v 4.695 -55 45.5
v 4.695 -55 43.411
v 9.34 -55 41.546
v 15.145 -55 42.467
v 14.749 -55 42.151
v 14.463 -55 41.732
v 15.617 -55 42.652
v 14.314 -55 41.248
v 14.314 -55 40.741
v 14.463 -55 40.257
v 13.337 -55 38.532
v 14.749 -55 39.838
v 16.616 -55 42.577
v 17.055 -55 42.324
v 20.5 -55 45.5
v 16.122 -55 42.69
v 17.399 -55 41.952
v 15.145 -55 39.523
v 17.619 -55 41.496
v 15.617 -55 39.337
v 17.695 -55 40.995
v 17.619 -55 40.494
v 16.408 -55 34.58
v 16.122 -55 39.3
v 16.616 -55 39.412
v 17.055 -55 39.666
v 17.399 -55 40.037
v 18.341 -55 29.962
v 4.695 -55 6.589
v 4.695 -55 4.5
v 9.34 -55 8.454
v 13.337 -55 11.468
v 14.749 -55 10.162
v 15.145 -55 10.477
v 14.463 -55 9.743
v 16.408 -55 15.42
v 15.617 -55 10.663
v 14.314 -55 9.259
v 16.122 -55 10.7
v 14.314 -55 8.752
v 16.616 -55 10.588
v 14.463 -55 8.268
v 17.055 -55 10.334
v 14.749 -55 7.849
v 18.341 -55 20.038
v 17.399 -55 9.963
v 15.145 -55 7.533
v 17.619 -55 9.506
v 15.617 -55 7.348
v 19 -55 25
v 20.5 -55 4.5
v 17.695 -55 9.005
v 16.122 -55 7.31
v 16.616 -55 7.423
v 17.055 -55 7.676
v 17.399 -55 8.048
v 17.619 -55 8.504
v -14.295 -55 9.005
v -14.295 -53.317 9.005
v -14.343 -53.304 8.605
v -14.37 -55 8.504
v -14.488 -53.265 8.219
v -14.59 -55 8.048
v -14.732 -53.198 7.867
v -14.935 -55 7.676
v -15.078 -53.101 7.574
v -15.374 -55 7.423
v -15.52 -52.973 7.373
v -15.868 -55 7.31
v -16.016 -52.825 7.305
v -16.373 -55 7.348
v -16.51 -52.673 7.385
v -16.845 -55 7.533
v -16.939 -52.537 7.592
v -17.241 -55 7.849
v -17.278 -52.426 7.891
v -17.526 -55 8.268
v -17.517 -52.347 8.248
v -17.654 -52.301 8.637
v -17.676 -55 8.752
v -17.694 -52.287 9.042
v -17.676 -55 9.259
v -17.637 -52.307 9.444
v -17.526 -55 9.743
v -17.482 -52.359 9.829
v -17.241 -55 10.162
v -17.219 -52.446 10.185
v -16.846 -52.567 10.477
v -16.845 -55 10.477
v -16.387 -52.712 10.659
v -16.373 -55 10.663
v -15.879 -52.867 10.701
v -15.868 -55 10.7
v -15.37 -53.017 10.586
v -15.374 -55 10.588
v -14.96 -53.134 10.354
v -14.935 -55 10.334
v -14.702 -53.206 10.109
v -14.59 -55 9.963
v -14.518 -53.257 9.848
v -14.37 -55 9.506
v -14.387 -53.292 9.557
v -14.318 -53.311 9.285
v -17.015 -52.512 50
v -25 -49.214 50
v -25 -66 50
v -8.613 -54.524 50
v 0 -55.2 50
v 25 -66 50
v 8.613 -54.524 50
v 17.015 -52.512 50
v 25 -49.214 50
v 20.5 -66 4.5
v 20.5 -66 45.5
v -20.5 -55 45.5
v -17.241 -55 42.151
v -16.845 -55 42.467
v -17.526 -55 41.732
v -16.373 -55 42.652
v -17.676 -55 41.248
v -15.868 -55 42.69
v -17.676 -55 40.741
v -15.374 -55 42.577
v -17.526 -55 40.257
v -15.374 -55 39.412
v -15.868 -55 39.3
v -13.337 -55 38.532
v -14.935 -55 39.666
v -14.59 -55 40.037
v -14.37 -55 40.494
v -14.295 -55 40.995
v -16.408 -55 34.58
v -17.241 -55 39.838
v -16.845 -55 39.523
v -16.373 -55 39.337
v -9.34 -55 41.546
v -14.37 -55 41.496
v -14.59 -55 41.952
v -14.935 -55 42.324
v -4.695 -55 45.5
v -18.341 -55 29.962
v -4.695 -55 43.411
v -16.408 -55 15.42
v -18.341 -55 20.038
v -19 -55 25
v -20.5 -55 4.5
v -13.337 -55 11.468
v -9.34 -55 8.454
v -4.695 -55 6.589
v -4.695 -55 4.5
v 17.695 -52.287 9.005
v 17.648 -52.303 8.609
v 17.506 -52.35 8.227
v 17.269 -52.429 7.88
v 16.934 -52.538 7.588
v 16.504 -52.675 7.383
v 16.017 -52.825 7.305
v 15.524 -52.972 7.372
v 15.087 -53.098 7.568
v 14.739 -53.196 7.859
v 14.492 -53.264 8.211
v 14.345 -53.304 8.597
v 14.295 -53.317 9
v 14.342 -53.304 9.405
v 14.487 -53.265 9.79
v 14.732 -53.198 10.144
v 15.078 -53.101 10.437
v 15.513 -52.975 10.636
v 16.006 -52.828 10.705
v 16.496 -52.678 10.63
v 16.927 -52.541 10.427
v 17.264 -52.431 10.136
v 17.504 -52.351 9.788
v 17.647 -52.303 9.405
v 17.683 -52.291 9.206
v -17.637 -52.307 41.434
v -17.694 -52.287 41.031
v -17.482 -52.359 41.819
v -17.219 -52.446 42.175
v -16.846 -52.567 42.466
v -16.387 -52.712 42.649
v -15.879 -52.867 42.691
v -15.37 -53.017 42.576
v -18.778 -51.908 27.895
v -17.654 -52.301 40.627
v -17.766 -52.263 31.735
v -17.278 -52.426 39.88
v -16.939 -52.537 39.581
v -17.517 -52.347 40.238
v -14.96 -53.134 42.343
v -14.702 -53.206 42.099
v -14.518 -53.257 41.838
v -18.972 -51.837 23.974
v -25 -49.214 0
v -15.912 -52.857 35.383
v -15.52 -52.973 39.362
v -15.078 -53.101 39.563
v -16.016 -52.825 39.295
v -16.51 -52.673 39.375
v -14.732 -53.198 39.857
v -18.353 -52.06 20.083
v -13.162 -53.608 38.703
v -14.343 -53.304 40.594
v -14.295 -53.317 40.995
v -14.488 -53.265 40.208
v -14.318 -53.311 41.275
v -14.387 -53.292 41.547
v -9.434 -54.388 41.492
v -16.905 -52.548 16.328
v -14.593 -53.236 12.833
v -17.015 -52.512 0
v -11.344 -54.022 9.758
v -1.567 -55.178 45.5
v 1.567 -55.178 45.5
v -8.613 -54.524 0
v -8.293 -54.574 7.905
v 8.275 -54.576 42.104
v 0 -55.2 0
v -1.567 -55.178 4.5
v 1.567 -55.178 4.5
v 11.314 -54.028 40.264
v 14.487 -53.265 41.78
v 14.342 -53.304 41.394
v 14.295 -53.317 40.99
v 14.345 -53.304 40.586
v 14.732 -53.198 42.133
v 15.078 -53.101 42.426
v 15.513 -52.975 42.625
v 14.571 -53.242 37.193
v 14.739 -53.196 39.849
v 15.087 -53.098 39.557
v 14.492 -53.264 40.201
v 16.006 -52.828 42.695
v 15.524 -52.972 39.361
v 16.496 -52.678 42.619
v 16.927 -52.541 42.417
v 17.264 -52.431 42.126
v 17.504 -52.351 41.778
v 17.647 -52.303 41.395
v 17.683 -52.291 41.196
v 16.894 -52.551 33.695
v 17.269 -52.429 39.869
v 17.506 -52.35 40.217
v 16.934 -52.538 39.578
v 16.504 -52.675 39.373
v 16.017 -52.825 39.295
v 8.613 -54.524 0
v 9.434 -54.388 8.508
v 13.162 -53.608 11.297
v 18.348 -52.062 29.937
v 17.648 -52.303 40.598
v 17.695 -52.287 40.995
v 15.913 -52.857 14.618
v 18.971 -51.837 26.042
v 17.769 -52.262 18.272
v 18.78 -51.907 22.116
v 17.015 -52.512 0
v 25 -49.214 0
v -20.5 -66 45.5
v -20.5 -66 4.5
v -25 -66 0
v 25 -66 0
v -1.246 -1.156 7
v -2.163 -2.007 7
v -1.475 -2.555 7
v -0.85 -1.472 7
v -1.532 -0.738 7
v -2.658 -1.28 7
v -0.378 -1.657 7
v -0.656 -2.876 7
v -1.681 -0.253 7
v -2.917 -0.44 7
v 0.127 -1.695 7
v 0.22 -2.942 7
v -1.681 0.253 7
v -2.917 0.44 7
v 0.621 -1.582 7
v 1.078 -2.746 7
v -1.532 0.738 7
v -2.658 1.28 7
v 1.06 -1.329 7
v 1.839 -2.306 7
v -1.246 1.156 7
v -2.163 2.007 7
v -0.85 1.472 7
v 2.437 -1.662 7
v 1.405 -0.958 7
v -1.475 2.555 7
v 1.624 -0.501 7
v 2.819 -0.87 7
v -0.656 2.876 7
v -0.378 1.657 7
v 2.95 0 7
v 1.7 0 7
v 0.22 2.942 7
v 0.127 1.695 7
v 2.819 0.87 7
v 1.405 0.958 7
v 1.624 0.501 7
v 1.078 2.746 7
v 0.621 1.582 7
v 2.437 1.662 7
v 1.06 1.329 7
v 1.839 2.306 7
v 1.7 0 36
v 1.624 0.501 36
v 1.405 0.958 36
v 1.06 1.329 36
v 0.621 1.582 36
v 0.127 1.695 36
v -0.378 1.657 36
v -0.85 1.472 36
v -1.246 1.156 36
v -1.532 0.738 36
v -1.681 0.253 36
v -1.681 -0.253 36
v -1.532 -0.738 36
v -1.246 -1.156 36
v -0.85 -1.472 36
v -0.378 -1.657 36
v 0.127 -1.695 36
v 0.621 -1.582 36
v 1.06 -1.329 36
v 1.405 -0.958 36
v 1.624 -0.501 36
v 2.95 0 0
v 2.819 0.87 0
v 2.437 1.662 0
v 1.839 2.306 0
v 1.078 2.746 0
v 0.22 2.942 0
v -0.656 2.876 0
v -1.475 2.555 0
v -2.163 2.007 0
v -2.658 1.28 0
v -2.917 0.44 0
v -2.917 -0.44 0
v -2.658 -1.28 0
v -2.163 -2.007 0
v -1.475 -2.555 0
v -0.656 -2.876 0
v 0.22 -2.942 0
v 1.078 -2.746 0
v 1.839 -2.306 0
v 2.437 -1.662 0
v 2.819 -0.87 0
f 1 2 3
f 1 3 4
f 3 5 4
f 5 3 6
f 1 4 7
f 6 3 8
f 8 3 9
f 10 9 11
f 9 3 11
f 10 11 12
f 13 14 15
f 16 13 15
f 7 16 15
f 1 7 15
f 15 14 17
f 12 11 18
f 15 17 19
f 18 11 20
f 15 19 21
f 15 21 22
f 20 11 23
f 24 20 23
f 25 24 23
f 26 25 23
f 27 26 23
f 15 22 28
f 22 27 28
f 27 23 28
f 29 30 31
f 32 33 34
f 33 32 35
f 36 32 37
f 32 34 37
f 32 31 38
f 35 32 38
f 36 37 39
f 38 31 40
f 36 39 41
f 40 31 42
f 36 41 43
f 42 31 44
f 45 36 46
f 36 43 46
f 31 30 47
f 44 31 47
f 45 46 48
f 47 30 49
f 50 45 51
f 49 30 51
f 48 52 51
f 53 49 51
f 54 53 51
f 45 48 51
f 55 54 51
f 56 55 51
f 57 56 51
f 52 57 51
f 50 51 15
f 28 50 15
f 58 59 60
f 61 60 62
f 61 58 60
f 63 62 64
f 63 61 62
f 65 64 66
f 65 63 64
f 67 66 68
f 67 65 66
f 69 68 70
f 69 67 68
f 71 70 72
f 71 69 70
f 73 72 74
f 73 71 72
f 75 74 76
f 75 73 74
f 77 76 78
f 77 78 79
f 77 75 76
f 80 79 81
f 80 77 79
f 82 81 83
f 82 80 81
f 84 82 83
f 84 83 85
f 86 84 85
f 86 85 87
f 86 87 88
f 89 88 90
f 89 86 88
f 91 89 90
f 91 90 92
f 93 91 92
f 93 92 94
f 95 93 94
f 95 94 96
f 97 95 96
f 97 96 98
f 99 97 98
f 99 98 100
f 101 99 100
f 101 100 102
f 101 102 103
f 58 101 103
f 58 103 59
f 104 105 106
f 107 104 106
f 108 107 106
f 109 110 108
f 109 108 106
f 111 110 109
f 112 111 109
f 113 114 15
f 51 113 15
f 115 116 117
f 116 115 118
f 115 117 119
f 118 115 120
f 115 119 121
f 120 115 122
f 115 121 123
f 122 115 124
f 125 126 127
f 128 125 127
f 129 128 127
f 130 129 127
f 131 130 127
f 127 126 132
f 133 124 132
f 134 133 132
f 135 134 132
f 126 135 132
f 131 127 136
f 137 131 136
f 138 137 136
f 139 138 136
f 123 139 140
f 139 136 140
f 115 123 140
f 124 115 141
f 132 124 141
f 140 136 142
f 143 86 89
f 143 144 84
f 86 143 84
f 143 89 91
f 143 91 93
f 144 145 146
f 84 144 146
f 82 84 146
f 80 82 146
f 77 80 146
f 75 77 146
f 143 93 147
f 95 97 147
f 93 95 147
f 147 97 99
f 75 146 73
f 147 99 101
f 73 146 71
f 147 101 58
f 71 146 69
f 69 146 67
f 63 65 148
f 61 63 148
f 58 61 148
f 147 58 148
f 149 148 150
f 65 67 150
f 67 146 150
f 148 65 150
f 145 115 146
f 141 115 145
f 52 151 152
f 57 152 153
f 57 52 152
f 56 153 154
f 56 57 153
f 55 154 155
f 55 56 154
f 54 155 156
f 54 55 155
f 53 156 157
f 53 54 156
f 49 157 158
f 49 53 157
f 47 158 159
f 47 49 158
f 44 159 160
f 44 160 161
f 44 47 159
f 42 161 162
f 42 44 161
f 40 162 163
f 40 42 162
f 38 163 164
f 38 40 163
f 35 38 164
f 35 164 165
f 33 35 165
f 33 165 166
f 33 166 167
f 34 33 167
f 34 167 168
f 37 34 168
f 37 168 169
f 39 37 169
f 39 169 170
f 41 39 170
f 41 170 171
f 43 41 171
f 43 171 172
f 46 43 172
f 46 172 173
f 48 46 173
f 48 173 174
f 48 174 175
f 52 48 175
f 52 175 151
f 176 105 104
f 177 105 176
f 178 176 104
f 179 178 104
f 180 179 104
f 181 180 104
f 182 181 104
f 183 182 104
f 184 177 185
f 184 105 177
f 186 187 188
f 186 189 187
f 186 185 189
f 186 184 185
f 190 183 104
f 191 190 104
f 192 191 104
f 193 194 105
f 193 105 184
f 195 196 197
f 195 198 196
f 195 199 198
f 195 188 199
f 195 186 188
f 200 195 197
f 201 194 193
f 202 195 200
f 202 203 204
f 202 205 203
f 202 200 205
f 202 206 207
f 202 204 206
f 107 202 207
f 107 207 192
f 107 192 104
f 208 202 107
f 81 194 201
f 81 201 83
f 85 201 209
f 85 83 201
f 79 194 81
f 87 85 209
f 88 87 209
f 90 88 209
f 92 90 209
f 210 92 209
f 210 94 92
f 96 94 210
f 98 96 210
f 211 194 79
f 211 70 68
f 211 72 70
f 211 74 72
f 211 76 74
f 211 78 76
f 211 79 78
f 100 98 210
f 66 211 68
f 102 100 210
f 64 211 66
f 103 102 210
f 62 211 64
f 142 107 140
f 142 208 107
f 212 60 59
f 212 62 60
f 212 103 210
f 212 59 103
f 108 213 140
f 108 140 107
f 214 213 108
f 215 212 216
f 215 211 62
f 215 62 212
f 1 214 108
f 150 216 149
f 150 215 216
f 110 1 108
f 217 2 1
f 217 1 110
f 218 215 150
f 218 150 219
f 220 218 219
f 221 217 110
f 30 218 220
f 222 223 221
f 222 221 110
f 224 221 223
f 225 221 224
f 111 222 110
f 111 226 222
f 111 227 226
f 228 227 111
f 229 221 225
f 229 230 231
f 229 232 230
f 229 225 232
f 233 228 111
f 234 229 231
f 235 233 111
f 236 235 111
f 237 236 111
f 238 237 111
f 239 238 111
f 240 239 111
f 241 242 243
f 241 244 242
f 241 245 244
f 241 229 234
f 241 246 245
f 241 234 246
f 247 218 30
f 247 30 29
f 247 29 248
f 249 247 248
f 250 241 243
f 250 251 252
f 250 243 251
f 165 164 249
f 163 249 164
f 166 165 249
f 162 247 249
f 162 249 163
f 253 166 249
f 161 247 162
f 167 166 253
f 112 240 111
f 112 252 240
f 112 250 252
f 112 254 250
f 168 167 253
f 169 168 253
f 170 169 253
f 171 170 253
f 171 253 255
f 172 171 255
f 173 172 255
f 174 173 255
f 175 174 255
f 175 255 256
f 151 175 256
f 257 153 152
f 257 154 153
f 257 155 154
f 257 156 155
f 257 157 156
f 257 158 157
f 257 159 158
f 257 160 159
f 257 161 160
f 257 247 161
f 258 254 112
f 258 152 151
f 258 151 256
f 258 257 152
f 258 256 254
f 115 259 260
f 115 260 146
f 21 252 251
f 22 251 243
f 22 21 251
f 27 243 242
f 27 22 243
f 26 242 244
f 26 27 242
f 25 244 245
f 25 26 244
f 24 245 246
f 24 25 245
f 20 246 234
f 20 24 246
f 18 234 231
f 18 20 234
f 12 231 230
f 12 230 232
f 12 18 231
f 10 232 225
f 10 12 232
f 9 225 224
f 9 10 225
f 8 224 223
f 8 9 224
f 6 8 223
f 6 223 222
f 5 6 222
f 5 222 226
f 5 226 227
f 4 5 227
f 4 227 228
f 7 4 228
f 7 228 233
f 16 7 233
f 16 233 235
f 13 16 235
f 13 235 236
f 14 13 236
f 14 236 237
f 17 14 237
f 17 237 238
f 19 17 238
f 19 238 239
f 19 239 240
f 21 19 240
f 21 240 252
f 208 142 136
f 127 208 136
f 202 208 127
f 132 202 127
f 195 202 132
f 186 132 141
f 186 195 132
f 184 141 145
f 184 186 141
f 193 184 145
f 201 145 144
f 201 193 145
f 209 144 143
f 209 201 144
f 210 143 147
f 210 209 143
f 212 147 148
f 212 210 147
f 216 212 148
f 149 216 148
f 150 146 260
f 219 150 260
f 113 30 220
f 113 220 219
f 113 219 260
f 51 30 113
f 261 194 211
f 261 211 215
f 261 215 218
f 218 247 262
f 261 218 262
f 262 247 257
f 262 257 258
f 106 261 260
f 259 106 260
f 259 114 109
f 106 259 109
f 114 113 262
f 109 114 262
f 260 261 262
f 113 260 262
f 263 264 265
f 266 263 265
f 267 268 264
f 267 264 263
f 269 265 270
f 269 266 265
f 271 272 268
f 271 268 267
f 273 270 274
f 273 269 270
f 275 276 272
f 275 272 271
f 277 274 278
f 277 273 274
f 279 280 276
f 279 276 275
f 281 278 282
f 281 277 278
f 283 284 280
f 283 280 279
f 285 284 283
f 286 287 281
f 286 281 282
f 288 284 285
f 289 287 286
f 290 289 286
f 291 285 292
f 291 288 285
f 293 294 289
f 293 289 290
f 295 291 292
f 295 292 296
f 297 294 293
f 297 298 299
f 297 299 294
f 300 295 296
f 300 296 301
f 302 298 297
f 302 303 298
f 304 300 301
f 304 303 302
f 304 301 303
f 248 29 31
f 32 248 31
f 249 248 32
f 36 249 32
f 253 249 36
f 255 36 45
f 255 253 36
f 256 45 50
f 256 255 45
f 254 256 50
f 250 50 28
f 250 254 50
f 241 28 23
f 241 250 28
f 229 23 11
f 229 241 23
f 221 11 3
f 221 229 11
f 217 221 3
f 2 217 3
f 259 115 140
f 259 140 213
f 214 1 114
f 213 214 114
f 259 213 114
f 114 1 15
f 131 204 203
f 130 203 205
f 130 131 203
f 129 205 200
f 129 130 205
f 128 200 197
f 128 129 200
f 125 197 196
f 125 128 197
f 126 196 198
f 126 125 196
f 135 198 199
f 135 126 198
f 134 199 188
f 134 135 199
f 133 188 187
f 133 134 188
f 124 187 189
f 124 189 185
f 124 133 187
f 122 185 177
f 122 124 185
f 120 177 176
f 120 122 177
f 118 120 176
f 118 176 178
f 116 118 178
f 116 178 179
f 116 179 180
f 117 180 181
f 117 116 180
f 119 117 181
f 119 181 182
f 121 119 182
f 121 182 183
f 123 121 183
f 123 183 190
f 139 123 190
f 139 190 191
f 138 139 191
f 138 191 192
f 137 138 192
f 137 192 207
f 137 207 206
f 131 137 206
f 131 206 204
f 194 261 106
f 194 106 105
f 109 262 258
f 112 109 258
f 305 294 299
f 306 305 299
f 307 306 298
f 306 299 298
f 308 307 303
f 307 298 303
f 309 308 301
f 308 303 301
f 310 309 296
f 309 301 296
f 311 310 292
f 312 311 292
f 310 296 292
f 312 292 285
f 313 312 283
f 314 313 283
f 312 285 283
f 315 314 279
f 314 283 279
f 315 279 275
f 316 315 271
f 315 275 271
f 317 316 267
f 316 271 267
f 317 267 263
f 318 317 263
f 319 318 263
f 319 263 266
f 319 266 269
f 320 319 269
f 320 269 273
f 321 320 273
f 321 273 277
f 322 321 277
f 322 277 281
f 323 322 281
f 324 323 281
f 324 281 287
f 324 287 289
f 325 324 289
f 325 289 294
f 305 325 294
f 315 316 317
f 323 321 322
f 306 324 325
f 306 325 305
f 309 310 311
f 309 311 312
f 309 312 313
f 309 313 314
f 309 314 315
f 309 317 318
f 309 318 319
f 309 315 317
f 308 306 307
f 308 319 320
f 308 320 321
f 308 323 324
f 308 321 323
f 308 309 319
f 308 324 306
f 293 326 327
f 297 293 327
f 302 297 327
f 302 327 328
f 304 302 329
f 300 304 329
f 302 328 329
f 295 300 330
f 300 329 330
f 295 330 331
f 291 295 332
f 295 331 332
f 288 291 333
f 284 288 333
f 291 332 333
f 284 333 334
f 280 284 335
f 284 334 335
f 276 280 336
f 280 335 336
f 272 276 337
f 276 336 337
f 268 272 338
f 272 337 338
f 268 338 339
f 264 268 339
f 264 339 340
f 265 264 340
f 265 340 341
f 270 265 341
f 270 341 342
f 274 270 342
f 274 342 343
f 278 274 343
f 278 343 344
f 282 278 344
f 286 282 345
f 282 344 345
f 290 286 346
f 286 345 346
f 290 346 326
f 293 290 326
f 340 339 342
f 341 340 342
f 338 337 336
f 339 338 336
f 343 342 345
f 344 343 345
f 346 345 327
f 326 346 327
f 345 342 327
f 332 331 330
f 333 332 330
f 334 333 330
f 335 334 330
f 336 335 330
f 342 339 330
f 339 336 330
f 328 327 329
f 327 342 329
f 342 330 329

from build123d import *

# Parameters (mm, degrees)
CYLINDER_R              = 2.95
CYLINDER_DEPTH          = 7
CYLINDER001_R           = 1.7
CYLINDER001_DEPTH       = 30
CLONE003_ROLL_ANGLE     = -90
CLONE001_ROLL_ANGLE     = -90
CLONE002_ROLL_ANGLE     = -90
CLONE_ROLL_ANGLE        = -90
BOX272_W                = 41
BOX272_H                = 11
BOX272_DEPTH            = 41
CYLINDER1064_R          = 19
CYLINDER1064_DEPTH      = 20
CYLINDER1064_ROLL_ANGLE = 90
CYLINDER1063_R          = 55.2
CYLINDER1063_DEPTH      = 50
BOX_W                   = 50
BOX_H                   = 25
BOX_DEPTH               = 50


with BuildPart() as m3bolthead:
    # Cylinder → Cylinder (new body)
    with BuildSketch(Plane.XY):
        Circle(CYLINDER_R)
    extrude(amount=CYLINDER_DEPTH)


with BuildPart() as m3bolt:
    # Cylinder001 → Cylinder001 (new body)
    with BuildSketch(Plane.XY.offset(6)):
        Circle(CYLINDER001_R)
    extrude(amount=CYLINDER001_DEPTH)

    # Fusion: union M3BoltHead
    add(m3bolthead.part)


with BuildPart() as clone_of_m3bolt003:
    # Clone003 base: copy of M3Bolt
    add(m3bolt.part)


with BuildPart() as clone_of_m3bolt003_1:
    # Clone003 roll: moved
    add(clone_of_m3bolt003.part.rotate(Axis((0, 0, 0), (1, 0, 0)), CLONE003_ROLL_ANGLE))


with BuildPart() as clone_of_m3bolt003_2:
    # Clone003 placement: moved
    add(clone_of_m3bolt003_1.part.moved(Location((-15.994718, -81.76, 40.994755))))


with BuildPart() as clone_of_m3bolt001:
    # Clone001 base: copy of M3Bolt
    add(m3bolt.part)


with BuildPart() as clone_of_m3bolt001_1:
    # Clone001 roll: moved
    add(clone_of_m3bolt001.part.rotate(Axis((0, 0, 0), (1, 0, 0)), CLONE001_ROLL_ANGLE))


with BuildPart() as clone_of_m3bolt001_2:
    # Clone001 placement: moved
    add(clone_of_m3bolt001_1.part.moved(Location((-15.994718, -81.76, 9.005245))))


with BuildPart() as clone_of_m3bolt002:
    # Clone002 base: copy of M3Bolt
    add(m3bolt.part)


with BuildPart() as clone_of_m3bolt002_1:
    # Clone002 roll: moved
    add(clone_of_m3bolt002.part.rotate(Axis((0, 0, 0), (1, 0, 0)), CLONE002_ROLL_ANGLE))


with BuildPart() as clone_of_m3bolt002_2:
    # Clone002 placement: moved
    add(clone_of_m3bolt002_1.part.moved(Location((15.994793, -81.76, 40.994755))))


with BuildPart() as fusion001:
    # Clone base: copy of M3Bolt
    add(m3bolt.part)


with BuildPart() as fusion001_1:
    # Clone roll: moved
    add(fusion001.part.rotate(Axis((0, 0, 0), (1, 0, 0)), CLONE_ROLL_ANGLE))


with BuildPart() as fusion001_2:
    # Clone placement: moved
    add(fusion001_1.part.moved(Location((15.994793, -81.76, 9.005245))))

    # Fusion001: union Clone of M3Bolt003, Clone of M3Bolt001, Clone of M3Bolt002
    add(clone_of_m3bolt003_2.part)
    add(clone_of_m3bolt001_2.part)
    add(clone_of_m3bolt002_2.part)


with BuildPart() as cube034:
    # Box272 → Box272 (new body)
    with BuildSketch(Plane(origin=(-20.5, -66, 4.5), x_dir=(1, 0, 0), z_dir=(0, 0, 1))):
        with Locations((20.5, 5.5)):
            Rectangle(BOX272_W, BOX272_H)
    extrude(amount=BOX272_DEPTH)


with BuildPart() as cylinder022:
    # Cylinder1064 → Cylinder1064 (new body)
    with BuildSketch(Plane.XY):
        Circle(CYLINDER1064_R)
    extrude(amount=CYLINDER1064_DEPTH)


with BuildPart() as cylinder022_1:
    # Cylinder1064 roll: moved
    add(cylinder022.part.rotate(Axis((0, 0, 0), (1, 0, 0)), CYLINDER1064_ROLL_ANGLE))


with BuildPart() as cylinder022_2:
    # Cylinder1064 placement: moved
    add(cylinder022_1.part.moved(Location((3.5e-05, -47, 25))))


with BuildPart() as cylinder:
    # Cylinder1063 → Cylinder1063 (new body)
    with BuildSketch(Plane.XY):
        Circle(CYLINDER1063_R)
    extrude(amount=CYLINDER1063_DEPTH)


with BuildPart() as art4bodyfan:
    # Box → Box (new body)
    with BuildSketch(Plane(origin=(-25, -66, 0), x_dir=(1, 0, 0), z_dir=(0, 0, 1))):
        with Locations((25, 12.5)):
            Rectangle(BOX_W, BOX_H)
    extrude(amount=BOX_DEPTH)

    # Cut: cut Cylinder
    add(cylinder.part, mode=Mode.SUBTRACT)

    # Cut149: cut Cylinder022
    add(cylinder022_2.part, mode=Mode.SUBTRACT)

    # Cut150: cut Cube034
    add(cube034.part, mode=Mode.SUBTRACT)

    # Cut151: cut Fusion001
    add(fusion001_2.part, mode=Mode.SUBTRACT)


solid = Compound([m3bolt.part, art4bodyfan.part])
